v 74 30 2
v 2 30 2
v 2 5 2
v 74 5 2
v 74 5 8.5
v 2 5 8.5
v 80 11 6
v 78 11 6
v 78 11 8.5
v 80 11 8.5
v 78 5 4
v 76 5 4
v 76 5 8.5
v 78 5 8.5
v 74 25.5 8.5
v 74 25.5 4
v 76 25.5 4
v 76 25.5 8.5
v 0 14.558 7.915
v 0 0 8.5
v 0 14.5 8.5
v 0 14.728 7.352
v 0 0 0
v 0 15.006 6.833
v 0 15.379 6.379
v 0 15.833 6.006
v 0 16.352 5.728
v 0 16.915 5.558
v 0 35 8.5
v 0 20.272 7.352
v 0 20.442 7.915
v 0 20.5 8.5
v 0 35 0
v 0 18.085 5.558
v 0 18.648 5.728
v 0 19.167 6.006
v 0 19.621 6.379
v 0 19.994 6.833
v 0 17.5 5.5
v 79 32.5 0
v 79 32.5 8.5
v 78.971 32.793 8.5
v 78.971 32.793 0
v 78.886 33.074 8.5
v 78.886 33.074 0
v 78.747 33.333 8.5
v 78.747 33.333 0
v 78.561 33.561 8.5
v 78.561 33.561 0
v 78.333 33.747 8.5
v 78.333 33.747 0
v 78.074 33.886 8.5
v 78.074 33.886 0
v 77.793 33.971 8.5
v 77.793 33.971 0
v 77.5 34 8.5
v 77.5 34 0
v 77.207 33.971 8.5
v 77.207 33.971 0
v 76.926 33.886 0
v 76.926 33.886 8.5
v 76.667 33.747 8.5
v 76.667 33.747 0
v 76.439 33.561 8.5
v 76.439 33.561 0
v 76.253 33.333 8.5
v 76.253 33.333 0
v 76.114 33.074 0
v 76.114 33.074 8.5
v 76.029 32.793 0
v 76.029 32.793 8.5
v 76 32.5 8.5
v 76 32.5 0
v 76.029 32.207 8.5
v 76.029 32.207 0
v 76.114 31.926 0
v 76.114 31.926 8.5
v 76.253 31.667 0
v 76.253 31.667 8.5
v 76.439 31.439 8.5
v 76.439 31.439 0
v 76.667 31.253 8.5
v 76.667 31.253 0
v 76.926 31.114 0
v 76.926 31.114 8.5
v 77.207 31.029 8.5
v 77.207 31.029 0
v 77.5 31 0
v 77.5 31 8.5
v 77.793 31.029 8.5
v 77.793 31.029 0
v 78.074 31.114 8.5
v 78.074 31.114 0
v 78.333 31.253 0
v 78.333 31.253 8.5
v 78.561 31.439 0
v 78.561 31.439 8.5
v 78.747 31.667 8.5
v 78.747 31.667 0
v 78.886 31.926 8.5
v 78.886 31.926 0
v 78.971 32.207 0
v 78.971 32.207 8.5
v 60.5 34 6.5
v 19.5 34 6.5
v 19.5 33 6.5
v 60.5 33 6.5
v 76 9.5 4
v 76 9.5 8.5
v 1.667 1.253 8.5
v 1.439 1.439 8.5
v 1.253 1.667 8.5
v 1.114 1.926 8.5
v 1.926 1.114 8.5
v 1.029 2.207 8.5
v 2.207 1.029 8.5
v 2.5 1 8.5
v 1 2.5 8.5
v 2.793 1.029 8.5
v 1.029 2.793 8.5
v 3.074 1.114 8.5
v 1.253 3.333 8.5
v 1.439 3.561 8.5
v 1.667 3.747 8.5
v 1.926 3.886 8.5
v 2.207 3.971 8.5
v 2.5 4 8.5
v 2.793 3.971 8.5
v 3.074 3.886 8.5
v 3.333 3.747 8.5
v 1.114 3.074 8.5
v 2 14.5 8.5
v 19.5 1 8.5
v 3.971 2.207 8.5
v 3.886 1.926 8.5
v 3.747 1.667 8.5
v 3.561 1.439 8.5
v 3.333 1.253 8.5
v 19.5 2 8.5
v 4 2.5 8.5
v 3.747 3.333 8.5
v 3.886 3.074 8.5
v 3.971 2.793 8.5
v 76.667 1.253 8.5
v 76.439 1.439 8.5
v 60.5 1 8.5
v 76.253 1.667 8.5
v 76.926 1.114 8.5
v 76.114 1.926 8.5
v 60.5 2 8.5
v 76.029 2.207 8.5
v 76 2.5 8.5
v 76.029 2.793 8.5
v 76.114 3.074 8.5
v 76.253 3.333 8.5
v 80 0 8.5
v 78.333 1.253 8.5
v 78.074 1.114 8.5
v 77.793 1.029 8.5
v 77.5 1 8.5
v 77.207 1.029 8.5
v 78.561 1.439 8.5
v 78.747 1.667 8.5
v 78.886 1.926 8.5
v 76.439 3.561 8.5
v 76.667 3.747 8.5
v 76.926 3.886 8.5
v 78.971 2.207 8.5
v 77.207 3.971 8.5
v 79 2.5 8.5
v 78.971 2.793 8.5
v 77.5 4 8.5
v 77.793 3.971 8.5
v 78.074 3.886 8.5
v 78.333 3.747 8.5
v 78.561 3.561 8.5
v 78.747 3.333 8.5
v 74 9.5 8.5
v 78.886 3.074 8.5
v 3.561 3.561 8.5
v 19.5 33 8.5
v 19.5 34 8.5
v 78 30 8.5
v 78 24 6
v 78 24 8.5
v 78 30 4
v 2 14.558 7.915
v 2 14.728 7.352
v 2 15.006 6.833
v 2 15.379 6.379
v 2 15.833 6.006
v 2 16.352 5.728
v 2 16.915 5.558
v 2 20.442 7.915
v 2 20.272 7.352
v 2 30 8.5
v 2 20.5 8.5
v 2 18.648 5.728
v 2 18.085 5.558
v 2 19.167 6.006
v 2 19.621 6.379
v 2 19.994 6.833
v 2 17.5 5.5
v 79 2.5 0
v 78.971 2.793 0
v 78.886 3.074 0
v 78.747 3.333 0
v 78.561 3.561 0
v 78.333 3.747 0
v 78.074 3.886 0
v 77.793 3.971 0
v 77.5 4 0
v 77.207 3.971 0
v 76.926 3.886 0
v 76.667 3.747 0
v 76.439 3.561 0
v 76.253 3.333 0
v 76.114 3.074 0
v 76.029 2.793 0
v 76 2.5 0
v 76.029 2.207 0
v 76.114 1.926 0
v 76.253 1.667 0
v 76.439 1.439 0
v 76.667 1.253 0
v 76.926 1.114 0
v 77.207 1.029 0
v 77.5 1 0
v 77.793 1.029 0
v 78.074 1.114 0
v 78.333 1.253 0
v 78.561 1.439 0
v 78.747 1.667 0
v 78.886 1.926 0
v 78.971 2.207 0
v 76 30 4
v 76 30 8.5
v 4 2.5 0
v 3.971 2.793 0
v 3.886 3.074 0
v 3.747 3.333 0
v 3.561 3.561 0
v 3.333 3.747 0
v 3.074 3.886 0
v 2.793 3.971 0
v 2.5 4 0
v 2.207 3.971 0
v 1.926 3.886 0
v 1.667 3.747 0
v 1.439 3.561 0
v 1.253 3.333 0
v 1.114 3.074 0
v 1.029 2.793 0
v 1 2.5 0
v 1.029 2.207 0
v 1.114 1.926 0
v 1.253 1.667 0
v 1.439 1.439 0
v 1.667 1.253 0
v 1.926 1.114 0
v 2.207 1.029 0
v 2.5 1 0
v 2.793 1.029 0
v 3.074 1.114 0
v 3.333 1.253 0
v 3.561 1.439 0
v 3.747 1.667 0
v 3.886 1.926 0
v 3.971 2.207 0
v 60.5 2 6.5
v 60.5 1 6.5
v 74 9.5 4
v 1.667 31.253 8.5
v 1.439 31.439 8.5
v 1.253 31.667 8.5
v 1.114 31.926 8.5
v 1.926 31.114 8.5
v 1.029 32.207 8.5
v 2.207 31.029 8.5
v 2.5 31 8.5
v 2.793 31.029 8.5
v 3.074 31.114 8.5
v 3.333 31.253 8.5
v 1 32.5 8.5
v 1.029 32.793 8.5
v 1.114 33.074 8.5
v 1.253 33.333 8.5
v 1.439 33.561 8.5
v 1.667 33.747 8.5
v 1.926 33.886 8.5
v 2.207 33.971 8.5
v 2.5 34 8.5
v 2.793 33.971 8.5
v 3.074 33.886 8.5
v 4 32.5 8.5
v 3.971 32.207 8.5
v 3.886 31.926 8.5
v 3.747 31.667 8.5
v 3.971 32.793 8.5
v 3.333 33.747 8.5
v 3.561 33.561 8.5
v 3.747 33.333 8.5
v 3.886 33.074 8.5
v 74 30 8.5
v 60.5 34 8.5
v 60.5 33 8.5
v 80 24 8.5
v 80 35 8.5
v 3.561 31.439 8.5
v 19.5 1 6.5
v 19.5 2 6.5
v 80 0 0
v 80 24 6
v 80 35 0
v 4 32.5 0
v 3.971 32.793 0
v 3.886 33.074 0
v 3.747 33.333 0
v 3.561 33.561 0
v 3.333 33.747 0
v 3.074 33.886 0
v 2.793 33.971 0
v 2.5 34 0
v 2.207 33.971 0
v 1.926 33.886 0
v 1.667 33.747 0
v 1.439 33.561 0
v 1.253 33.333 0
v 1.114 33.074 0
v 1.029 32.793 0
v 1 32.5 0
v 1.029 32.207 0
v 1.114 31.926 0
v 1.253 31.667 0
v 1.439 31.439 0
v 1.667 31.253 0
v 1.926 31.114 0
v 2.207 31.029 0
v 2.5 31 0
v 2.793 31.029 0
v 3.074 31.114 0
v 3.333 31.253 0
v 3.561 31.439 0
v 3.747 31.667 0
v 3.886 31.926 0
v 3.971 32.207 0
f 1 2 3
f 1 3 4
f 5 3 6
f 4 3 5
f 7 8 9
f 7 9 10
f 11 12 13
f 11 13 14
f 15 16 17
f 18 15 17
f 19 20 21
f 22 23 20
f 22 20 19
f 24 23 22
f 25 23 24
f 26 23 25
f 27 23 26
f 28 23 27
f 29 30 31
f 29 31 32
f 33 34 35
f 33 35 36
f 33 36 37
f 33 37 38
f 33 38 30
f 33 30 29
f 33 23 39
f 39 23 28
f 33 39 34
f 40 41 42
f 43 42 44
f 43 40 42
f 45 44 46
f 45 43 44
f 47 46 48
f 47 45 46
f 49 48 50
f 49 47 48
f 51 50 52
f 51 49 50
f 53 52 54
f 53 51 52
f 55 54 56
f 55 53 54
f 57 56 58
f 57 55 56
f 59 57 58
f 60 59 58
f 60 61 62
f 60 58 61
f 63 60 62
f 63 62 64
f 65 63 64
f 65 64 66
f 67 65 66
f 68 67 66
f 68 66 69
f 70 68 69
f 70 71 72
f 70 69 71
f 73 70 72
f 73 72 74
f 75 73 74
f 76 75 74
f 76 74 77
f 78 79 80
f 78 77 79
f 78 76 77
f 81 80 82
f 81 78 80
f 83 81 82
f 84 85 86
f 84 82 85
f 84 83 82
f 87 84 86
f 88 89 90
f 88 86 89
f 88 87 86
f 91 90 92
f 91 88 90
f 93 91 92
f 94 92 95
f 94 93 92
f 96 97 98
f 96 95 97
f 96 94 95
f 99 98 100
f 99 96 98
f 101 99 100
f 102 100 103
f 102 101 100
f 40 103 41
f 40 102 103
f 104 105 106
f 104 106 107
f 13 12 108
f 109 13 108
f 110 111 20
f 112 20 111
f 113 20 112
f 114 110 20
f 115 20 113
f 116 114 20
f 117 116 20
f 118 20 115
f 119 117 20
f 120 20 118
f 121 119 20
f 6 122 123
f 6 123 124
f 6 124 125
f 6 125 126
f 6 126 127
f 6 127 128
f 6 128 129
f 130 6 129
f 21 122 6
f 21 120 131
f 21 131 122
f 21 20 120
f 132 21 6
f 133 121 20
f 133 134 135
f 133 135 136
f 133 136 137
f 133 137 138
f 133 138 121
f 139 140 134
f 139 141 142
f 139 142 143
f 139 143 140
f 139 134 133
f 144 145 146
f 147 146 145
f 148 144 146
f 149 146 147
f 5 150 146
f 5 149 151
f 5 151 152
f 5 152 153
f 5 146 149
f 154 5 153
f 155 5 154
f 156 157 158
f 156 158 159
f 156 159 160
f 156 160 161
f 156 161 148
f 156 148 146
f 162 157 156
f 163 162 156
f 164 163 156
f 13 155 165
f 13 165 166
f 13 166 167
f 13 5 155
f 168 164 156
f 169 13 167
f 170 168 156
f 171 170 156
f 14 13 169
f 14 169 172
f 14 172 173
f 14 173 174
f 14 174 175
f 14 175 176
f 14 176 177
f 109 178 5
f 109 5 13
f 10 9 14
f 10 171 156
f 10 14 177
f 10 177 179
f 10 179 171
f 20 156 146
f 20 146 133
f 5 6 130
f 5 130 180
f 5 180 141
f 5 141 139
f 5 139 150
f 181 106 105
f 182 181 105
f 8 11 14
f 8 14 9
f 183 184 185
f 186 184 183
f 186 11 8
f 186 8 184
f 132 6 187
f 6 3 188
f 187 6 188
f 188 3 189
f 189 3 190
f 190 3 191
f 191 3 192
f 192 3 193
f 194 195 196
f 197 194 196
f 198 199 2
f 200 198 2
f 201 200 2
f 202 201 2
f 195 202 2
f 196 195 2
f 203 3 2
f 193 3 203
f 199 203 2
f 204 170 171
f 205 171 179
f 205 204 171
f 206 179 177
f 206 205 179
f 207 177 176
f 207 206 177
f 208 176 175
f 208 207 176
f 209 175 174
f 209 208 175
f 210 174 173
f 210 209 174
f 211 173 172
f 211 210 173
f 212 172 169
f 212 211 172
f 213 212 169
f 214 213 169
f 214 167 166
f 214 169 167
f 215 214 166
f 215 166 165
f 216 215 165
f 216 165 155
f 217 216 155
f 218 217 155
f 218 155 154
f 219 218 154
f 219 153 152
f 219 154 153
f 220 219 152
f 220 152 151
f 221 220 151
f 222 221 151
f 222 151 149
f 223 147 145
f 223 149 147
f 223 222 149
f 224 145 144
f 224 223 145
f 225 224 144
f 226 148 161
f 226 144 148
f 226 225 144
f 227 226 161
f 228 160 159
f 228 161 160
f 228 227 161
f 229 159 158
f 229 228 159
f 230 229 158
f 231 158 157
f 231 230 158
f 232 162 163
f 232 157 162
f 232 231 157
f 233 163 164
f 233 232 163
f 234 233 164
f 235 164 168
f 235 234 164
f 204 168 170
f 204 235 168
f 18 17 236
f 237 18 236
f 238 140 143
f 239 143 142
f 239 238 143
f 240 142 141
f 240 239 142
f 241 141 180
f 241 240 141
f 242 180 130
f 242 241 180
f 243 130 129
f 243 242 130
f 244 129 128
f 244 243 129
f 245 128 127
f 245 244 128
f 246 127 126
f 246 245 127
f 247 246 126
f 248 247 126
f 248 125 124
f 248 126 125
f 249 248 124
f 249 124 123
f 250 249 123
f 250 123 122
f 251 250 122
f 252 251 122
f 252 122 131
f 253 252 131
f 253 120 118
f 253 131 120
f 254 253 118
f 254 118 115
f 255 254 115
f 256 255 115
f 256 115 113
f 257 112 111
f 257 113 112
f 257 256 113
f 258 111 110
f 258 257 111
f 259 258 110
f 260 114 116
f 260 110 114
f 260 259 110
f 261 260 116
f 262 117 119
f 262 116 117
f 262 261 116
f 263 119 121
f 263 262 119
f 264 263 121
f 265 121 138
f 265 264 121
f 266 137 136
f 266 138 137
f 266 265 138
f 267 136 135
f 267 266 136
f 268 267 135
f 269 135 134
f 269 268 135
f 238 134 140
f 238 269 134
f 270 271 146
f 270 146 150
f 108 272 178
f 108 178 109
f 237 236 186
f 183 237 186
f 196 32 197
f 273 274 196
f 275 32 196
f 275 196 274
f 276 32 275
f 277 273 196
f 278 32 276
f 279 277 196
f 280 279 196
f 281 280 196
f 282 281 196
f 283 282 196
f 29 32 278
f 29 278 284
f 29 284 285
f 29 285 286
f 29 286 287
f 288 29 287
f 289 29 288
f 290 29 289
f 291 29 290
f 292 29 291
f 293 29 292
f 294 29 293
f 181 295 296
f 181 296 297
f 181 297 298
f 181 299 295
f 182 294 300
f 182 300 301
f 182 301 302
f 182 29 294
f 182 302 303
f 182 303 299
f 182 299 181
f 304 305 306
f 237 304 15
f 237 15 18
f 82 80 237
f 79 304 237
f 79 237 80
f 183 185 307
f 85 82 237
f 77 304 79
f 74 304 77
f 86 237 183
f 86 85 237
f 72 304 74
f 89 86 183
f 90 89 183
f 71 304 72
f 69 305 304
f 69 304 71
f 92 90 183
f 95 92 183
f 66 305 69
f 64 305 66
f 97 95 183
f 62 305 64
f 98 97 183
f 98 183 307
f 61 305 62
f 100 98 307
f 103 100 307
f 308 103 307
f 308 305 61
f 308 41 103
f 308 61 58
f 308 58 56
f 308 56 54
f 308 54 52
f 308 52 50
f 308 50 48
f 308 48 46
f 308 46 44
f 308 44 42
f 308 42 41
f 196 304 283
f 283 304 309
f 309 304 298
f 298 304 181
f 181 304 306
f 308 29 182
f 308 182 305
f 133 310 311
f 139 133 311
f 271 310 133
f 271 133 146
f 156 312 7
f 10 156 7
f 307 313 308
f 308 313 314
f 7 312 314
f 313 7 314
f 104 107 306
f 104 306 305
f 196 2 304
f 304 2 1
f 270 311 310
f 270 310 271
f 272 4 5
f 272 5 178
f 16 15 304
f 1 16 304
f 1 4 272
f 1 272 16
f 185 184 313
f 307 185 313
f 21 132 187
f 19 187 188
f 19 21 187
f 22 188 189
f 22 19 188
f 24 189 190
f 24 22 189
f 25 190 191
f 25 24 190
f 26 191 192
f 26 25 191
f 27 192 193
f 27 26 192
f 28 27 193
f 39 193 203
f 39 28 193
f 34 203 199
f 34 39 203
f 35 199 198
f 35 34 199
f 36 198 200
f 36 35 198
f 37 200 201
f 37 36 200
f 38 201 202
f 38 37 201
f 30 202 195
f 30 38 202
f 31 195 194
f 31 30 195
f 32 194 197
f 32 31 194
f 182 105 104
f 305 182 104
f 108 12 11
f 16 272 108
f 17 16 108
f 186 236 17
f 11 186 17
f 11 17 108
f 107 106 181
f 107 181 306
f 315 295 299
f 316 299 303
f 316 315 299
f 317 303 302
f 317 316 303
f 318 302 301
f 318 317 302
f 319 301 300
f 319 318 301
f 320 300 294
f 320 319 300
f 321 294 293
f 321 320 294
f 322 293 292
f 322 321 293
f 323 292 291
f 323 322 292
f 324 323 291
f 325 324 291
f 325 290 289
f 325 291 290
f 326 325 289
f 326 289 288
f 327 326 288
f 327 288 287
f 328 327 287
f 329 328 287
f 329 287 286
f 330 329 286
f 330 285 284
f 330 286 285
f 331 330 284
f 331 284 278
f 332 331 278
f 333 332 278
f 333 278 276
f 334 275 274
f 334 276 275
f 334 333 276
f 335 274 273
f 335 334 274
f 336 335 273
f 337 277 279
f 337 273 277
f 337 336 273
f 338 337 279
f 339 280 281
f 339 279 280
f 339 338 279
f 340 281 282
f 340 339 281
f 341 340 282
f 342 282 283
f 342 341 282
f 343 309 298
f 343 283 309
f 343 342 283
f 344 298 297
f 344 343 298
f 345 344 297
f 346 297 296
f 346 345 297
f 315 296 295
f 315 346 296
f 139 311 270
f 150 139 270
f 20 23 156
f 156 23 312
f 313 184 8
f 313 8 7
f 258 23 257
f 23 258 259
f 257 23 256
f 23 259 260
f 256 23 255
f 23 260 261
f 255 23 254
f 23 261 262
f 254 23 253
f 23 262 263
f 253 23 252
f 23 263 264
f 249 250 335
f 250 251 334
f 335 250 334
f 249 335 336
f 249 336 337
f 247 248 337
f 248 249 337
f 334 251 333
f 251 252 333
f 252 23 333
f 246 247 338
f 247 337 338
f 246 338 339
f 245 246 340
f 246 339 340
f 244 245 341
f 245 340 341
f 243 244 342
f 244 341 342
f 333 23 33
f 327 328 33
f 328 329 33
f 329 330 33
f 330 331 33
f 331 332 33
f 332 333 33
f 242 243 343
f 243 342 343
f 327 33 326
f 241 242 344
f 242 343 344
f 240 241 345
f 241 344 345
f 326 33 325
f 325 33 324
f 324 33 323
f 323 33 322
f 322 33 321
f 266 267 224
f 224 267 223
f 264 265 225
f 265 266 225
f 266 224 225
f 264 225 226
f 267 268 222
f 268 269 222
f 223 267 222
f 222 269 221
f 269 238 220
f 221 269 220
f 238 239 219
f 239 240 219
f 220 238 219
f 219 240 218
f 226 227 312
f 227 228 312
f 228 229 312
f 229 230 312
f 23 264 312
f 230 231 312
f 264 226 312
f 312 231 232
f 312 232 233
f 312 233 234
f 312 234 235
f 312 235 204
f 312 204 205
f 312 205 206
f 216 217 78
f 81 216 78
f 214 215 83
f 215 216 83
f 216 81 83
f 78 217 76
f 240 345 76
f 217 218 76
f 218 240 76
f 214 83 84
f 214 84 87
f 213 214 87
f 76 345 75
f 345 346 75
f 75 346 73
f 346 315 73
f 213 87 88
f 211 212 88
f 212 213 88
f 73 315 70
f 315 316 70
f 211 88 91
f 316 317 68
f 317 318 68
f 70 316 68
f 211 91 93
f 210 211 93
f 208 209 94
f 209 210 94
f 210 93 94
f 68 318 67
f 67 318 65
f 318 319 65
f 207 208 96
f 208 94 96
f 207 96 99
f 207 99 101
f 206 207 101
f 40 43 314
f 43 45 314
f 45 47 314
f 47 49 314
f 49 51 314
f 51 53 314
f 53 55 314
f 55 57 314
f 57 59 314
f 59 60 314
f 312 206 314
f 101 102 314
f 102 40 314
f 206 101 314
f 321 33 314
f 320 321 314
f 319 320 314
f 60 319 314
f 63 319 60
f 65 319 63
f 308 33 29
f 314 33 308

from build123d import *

# Parameters (mm, degrees)
BOX009_W             = 41
BOX009_H             = 1
BOX009_DEPTH         = 2
BOX008_W             = 41
BOX008_H             = 1
BOX008_DEPTH         = 2
CYLINDER004_R        = 1.5
CYLINDER004_DEPTH    = 10
CYLINDER003_R        = 1.5
CYLINDER003_DEPTH    = 10
CYLINDER002_R        = 1.5
CYLINDER002_DEPTH    = 10
CYLINDER001_R        = 1.5
CYLINDER001_DEPTH    = 10
BOX005_W             = 3
BOX005_H             = 25
BOX005_DEPTH         = 10
BOX004_W             = 2
BOX004_H             = 16
BOX004_DEPTH         = 9
BOX003_W             = 2
BOX003_H             = 13
BOX003_DEPTH         = 5
BOX002_W             = 2
BOX002_H             = 25
BOX002_DEPTH         = 9
CYLINDER_R           = 3
CYLINDER_DEPTH       = 2
CYLINDER_PITCH_ANGLE = 90
BOX001_W             = 69
BOX001_H             = 25
BOX001_DEPTH         = 13
BOX_W                = 80
BOX_H                = 35
BOX_DEPTH            = 8.5


with BuildPart() as box009:
    # Box009 → Box009 (new body)
    with BuildSketch(Plane(origin=(19.5, 1, 6.5), x_dir=(1, 0, 0), z_dir=(0, 0, 1))):
        with Locations((20.5, 0.5)):
            Rectangle(BOX009_W, BOX009_H)
    extrude(amount=BOX009_DEPTH)


with BuildPart() as box008:
    # Box008 → Box008 (new body)
    with BuildSketch(Plane(origin=(19.5, 33, 6.5), x_dir=(1, 0, 0), z_dir=(0, 0, 1))):
        with Locations((20.5, 0.5)):
            Rectangle(BOX008_W, BOX008_H)
    extrude(amount=BOX008_DEPTH)


with BuildPart() as cylinder004:
    # Cylinder004 → Cylinder004 (new body)
    with BuildSketch(Plane(origin=(2.5, 32.5, 0), x_dir=(1, 0, 0), z_dir=(0, 0, 1))):
        Circle(CYLINDER004_R)
    extrude(amount=CYLINDER004_DEPTH)


with BuildPart() as cylinder003:
    # Cylinder003 → Cylinder003 (new body)
    with BuildSketch(Plane(origin=(77.5, 32.5, 0), x_dir=(1, 0, 0), z_dir=(0, 0, 1))):
        Circle(CYLINDER003_R)
    extrude(amount=CYLINDER003_DEPTH)


with BuildPart() as cylinder002:
    # Cylinder002 → Cylinder002 (new body)
    with BuildSketch(Plane(origin=(77.5, 2.5, 0), x_dir=(1, 0, 0), z_dir=(0, 0, 1))):
        Circle(CYLINDER002_R)
    extrude(amount=CYLINDER002_DEPTH)


with BuildPart() as cylinder001:
    # Cylinder001 → Cylinder001 (new body)
    with BuildSketch(Plane(origin=(2.5, 2.5, 0), x_dir=(1, 0, 0), z_dir=(0, 0, 1))):
        Circle(CYLINDER001_R)
    extrude(amount=CYLINDER001_DEPTH)


with BuildPart() as box005:
    # Box005 → Box005 (new body)
    with BuildSketch(Plane(origin=(2, 5, 2), x_dir=(1, 0, 0), z_dir=(0, 0, 1))):
        with Locations((1.5, 12.5)):
            Rectangle(BOX005_W, BOX005_H)
    extrude(amount=BOX005_DEPTH)


with BuildPart() as box004:
    # Box004 → Box004 (new body)
    with BuildSketch(Plane(origin=(74, 9.5, 4), x_dir=(1, 0, 0), z_dir=(0, 0, 1))):
        with Locations((1, 8)):
            Rectangle(BOX004_W, BOX004_H)
    extrude(amount=BOX004_DEPTH)


with BuildPart() as u:
    # Box003 → Box003 (new body)
    with BuildSketch(Plane(origin=(78, 11, 6), x_dir=(1, 0, 0), z_dir=(0, 0, 1))):
        with Locations((1, 6.5)):
            Rectangle(BOX003_W, BOX003_H)
    extrude(amount=BOX003_DEPTH)


with BuildPart() as box002:
    # Box002 → Box002 (new body)
    with BuildSketch(Plane(origin=(76, 5, 4), x_dir=(1, 0, 0), z_dir=(0, 0, 1))):
        with Locations((1, 12.5)):
            Rectangle(BOX002_W, BOX002_H)
    extrude(amount=BOX002_DEPTH)


with BuildPart() as cylinder:
    # Cylinder → Cylinder (new body)
    with BuildSketch(Plane.XY):
        Circle(CYLINDER_R)
    extrude(amount=CYLINDER_DEPTH)


with BuildPart() as cylinder_1:
    # Cylinder pitch: moved
    add(cylinder.part.rotate(Axis((0, 0, 0), (0, 1, 0)), CYLINDER_PITCH_ANGLE))


with BuildPart() as cylinder_2:
    # Cylinder placement: moved
    add(cylinder_1.part.moved(Location((0, 17.5, 8.5))))


with BuildPart() as box001:
    # Box001 → Box001 (new body)
    with BuildSketch(Plane(origin=(5, 5, 2), x_dir=(1, 0, 0), z_dir=(0, 0, 1))):
        with Locations((34.5, 12.5)):
            Rectangle(BOX001_W, BOX001_H)
    extrude(amount=BOX001_DEPTH)


with BuildPart() as cut011:
    # Box → Box (new body)
    with BuildSketch(Plane.XY):
        with Locations((40, 17.5)):
            Rectangle(BOX_W, BOX_H)
    extrude(amount=BOX_DEPTH)

    # Cut: cut Box001
    add(box001.part, mode=Mode.SUBTRACT)

    # Cut001: cut Cylinder
    add(cylinder_2.part, mode=Mode.SUBTRACT)

    # Cut002: cut Box002
    add(box002.part, mode=Mode.SUBTRACT)

    # Cut003: cut U口
    add(u.part, mode=Mode.SUBTRACT)

    # Cut004: cut Box004
    add(box004.part, mode=Mode.SUBTRACT)

    # Cut005: cut Box005
    add(box005.part, mode=Mode.SUBTRACT)

    # Cut006: cut Cylinder001
    add(cylinder001.part, mode=Mode.SUBTRACT)

    # Cut007: cut Cylinder002
    add(cylinder002.part, mode=Mode.SUBTRACT)

    # Cut008: cut Cylinder003
    add(cylinder003.part, mode=Mode.SUBTRACT)

    # Cut009: cut Cylinder004
    add(cylinder004.part, mode=Mode.SUBTRACT)

    # Cut010: cut Box008
    add(box008.part, mode=Mode.SUBTRACT)

    # Cut011: cut Box009
    add(box009.part, mode=Mode.SUBTRACT)


solid = cut011.part
